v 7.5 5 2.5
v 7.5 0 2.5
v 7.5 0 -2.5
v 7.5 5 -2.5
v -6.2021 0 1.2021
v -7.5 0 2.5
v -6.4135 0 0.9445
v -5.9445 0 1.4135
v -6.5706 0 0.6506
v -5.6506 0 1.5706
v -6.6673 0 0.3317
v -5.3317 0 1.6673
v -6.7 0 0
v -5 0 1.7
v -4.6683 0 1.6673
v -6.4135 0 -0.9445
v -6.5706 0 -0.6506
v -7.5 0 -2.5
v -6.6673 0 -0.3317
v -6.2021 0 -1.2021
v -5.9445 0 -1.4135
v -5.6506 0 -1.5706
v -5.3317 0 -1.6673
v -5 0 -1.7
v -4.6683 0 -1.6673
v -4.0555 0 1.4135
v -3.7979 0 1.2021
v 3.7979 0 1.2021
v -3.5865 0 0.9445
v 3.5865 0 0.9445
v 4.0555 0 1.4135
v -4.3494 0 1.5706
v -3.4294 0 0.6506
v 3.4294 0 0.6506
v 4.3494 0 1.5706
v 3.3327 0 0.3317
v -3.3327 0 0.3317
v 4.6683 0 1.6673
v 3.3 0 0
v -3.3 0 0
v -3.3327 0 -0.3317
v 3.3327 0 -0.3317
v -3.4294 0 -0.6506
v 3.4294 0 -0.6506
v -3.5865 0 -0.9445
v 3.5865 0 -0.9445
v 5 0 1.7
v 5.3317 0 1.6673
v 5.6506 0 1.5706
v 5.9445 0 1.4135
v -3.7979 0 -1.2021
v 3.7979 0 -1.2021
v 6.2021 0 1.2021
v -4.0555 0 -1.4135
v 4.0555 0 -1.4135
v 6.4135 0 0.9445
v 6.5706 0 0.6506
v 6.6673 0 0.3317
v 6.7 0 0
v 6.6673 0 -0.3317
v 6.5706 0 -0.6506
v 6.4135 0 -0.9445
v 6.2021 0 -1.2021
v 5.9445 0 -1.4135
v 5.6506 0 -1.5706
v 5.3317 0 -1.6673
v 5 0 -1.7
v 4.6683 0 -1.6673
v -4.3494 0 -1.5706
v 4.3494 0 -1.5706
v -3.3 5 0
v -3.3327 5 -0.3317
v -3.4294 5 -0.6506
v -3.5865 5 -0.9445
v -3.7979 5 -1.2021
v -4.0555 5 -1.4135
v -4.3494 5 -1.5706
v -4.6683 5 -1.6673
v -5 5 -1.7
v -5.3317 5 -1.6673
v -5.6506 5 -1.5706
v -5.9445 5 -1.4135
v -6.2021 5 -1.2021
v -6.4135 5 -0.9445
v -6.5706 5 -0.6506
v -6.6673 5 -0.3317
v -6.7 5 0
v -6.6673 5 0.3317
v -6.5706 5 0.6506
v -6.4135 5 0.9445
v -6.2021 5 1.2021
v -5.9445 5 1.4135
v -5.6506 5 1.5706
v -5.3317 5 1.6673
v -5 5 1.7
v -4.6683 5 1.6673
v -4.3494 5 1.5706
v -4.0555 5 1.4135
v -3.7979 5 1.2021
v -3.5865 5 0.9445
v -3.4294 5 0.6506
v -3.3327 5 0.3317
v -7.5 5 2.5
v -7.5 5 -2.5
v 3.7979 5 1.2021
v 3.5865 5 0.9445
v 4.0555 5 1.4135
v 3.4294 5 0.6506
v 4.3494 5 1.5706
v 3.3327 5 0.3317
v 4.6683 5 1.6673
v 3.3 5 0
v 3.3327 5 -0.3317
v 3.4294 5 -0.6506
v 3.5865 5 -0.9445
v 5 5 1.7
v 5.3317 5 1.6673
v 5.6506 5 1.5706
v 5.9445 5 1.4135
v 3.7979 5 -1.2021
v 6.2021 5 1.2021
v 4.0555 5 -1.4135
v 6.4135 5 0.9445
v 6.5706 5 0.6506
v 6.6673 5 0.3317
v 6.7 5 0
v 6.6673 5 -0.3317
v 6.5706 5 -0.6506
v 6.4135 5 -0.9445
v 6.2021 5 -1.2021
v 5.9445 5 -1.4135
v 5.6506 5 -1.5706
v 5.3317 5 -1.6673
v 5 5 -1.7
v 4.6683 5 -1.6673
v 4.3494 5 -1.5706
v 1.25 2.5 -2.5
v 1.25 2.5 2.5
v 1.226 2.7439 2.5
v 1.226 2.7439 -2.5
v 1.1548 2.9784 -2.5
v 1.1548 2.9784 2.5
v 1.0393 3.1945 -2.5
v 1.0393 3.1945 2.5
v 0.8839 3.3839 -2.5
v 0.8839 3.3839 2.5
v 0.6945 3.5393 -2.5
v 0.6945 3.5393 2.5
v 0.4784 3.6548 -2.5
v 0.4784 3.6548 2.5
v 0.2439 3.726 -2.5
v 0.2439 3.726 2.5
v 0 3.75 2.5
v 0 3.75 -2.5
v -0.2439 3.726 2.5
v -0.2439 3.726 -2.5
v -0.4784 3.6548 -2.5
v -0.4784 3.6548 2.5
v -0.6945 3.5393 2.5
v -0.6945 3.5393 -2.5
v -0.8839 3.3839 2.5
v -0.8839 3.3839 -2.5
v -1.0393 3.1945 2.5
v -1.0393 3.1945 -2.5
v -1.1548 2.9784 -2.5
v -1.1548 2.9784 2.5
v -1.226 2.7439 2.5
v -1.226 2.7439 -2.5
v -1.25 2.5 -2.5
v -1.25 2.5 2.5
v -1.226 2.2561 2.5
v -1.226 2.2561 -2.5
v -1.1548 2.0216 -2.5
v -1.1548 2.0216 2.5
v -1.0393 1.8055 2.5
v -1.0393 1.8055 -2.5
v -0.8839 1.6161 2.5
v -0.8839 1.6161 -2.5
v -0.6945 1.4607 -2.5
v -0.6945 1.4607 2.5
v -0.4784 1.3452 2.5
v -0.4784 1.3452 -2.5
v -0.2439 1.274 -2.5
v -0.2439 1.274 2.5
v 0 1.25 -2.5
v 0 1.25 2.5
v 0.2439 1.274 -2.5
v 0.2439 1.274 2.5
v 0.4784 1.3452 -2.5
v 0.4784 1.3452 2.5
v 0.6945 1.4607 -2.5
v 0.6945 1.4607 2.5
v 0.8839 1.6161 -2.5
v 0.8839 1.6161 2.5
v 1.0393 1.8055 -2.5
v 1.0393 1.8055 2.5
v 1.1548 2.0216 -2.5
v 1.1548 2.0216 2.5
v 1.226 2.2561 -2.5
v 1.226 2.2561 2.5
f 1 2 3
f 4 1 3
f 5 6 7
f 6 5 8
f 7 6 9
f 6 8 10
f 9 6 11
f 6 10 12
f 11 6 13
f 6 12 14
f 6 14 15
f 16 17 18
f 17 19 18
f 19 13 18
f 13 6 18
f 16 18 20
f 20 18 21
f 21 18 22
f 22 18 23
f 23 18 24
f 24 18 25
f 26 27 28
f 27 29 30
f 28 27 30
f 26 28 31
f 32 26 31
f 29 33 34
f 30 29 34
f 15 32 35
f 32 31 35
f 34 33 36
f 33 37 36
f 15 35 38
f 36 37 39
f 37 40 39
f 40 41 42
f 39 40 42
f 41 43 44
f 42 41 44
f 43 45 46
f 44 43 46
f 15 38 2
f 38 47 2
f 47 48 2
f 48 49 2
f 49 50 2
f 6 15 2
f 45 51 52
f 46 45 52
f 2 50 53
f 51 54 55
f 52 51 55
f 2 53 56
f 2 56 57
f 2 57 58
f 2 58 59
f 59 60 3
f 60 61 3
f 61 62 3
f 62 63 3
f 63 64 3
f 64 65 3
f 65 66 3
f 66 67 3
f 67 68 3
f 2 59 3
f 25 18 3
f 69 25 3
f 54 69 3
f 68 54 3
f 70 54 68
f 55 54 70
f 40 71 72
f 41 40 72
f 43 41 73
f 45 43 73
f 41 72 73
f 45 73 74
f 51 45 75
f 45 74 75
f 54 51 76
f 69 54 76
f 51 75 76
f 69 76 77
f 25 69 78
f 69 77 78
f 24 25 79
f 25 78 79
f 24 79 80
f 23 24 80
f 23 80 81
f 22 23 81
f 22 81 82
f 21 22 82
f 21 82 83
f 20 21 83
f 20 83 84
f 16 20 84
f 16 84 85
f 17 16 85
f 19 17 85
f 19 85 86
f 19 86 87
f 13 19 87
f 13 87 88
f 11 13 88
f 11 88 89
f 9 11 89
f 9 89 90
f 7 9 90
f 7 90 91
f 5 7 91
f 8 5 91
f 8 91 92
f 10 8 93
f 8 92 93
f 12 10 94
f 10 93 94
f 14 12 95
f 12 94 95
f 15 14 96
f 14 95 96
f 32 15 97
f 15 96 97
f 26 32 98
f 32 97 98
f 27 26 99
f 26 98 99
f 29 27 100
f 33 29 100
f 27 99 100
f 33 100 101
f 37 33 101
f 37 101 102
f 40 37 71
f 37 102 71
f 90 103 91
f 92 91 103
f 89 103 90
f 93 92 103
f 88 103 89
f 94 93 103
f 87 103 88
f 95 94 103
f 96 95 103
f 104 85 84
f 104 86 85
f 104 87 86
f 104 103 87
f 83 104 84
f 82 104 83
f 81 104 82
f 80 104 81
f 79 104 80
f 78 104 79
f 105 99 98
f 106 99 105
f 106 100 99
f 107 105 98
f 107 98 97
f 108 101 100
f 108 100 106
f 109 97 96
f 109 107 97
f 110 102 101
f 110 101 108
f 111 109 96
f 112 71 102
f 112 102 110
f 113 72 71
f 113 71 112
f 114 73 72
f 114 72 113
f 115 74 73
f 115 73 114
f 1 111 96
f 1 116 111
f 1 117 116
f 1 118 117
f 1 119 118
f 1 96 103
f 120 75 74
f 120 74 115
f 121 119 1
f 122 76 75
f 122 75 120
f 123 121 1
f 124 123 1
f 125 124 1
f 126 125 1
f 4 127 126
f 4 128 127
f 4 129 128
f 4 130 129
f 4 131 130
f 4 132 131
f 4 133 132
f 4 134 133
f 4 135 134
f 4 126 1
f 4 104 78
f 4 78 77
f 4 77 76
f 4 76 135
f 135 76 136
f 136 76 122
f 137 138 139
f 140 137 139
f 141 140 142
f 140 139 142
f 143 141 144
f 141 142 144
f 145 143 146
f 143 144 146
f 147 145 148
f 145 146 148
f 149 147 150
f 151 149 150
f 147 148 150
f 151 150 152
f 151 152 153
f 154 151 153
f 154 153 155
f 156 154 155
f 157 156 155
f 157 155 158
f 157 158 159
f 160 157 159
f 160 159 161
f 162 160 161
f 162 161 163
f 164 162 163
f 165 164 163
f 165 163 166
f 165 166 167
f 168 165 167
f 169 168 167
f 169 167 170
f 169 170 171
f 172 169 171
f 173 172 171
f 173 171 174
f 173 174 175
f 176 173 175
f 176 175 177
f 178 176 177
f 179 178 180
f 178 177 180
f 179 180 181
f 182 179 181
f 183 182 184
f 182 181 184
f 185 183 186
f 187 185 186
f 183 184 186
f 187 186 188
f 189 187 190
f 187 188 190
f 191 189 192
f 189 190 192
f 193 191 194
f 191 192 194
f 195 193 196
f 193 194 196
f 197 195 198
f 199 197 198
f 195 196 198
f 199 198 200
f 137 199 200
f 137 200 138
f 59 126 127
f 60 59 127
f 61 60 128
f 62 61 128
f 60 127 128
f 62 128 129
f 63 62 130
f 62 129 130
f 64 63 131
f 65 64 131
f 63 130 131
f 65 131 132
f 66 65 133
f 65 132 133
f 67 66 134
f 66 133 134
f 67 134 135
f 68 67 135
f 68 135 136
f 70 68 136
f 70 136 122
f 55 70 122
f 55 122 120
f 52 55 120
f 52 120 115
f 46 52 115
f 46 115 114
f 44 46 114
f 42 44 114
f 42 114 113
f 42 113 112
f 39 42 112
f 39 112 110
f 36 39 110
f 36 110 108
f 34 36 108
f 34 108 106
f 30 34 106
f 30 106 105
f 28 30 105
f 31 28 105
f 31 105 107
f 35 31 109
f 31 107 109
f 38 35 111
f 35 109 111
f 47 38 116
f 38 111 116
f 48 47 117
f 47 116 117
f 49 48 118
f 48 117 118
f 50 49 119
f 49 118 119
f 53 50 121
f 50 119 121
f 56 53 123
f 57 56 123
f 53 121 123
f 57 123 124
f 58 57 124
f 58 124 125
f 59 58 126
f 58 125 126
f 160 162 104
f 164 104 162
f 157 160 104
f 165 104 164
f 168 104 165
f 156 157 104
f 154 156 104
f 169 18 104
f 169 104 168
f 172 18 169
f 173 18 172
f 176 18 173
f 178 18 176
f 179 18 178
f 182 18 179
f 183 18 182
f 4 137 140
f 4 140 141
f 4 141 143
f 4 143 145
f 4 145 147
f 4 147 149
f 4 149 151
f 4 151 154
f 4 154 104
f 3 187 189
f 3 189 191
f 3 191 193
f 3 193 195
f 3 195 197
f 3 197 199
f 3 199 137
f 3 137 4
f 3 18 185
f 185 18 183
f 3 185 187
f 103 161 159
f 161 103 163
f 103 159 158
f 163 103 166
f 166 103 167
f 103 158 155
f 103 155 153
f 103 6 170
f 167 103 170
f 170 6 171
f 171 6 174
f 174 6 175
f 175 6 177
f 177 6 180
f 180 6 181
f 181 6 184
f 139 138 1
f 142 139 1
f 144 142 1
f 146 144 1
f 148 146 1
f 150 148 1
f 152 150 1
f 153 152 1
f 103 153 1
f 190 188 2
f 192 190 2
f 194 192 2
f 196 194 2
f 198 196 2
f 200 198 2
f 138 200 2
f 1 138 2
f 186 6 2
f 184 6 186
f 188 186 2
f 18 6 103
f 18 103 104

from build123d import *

# Parameters (mm, degrees)
CROQUIS1_W              = 15
CROQUIS1_H              = 5
SALIENTE_EXTRUIR1_DEPTH = 5
CROQUIS2_R              = 1.7
CORTAR_EXTRUIR1_DEPTH   = 6
CROQUIS3_R              = 1.25
CORTAR_EXTRUIR2_DEPTH   = 6


with BuildPart() as part:
    # Croquis1 → Saliente-Extruir1 (new body)
    with BuildSketch(Plane(origin=(0, 0, 0), x_dir=(1, 0, 0), z_dir=(0, 1, 0))):
        Rectangle(CROQUIS1_W, CROQUIS1_H)
    extrude(amount=SALIENTE_EXTRUIR1_DEPTH)

    # Croquis2 → Cortar-Extruir1 (cut, through all)
    with BuildSketch(Plane(origin=(0, 5, 0), x_dir=(1, 0, 0), z_dir=(0, 1, 0))):
        with Locations((-5, 0)):
            Circle(CROQUIS2_R)
        with Locations((5, 0)):
            Circle(CROQUIS2_R)
    extrude(amount=-CORTAR_EXTRUIR1_DEPTH, mode=Mode.SUBTRACT)

    # Croquis3 → Cortar-Extruir2 (cut, through all)
    with BuildSketch(Plane.XY.offset(2.5)):
        with Locations((0, 2.5)):
            Circle(CROQUIS3_R)
    extrude(amount=-CORTAR_EXTRUIR2_DEPTH, mode=Mode.SUBTRACT)


solid = part.part
